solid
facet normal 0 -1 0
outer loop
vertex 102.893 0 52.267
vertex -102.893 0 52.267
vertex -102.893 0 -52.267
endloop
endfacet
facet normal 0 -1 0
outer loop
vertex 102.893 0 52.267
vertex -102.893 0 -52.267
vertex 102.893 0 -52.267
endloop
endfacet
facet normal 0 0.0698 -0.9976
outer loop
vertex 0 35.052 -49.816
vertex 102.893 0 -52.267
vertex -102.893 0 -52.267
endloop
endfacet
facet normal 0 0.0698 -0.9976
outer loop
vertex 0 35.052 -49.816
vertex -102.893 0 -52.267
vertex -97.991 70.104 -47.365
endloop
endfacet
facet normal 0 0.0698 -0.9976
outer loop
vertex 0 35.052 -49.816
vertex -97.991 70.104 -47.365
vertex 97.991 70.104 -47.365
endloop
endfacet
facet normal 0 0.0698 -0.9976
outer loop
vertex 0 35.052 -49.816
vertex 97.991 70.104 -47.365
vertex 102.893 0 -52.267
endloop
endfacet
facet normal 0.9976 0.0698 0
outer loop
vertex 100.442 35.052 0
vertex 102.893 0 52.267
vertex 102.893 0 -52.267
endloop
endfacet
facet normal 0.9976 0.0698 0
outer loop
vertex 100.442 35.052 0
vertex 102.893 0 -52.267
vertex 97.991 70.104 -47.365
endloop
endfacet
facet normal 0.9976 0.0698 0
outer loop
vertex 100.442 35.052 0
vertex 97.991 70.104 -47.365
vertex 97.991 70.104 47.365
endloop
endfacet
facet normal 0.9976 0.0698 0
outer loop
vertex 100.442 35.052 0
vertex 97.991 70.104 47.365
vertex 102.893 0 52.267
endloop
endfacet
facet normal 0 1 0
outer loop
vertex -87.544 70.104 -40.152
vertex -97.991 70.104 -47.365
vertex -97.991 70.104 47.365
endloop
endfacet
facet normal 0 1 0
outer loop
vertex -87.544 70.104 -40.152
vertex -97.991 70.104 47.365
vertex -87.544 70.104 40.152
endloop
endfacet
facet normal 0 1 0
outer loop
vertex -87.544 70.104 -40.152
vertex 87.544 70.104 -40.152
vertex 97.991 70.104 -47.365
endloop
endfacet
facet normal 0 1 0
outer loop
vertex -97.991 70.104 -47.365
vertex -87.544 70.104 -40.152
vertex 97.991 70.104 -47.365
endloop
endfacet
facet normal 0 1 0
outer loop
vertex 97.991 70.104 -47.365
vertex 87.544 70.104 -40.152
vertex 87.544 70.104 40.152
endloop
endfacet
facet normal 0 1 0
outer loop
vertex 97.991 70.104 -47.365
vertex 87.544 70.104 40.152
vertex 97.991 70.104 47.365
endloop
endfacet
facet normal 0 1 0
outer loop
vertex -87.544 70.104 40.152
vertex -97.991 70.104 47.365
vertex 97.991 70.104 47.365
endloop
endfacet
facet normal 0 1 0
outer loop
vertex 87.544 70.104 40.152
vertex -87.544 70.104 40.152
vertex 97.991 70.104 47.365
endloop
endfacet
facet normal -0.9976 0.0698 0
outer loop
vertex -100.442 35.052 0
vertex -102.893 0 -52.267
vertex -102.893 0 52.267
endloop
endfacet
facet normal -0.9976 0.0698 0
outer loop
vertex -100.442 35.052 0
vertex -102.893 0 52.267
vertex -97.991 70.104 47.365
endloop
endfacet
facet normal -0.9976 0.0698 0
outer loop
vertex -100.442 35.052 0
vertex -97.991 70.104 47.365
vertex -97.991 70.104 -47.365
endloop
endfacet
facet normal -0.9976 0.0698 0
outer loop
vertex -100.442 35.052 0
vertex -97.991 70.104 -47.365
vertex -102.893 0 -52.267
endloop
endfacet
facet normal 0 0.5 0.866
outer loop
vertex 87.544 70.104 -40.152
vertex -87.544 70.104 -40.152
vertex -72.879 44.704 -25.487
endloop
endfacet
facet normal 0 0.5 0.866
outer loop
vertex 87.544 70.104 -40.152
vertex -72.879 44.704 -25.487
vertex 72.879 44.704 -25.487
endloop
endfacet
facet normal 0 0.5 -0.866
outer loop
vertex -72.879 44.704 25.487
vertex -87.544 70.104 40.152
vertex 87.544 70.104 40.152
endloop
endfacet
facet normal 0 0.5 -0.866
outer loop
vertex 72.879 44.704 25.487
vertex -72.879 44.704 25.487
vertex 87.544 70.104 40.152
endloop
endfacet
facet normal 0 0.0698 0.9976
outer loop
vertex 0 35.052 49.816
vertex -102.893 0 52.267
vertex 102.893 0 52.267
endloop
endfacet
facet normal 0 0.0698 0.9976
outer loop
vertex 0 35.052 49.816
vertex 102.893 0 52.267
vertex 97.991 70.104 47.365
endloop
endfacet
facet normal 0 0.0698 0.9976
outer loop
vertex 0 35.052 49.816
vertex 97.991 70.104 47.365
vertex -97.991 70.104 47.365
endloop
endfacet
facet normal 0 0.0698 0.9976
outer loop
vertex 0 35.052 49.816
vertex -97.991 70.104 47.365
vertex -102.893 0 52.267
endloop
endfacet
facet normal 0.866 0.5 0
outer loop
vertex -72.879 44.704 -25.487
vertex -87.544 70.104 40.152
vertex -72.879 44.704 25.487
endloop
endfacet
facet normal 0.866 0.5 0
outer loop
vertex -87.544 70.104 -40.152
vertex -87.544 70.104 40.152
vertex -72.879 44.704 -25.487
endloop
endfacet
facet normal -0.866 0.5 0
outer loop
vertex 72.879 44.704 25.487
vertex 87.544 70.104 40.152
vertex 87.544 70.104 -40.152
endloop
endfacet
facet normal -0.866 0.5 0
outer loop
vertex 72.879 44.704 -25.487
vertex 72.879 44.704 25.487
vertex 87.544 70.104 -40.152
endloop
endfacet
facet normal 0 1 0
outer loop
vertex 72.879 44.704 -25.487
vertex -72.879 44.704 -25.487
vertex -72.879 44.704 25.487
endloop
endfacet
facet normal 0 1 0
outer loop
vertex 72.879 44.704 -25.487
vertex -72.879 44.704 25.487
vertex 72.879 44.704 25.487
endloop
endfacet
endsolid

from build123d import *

# Parameters (mm, degrees)
SKETCH1_W           = 205.785682804
SKETCH1_H           = 104.534748446
BOSS_EXTRUDE1_DEPTH = 70.104
BOSS_EXTRUDE1_TAPER = 4
SKETCH2_W           = 145.758865666
SKETCH2_H           = 50.974097726
CUT_EXTRUDE1_DEPTH  = 25.4
DRAFT1_ANGLE        = 30


with BuildPart() as part:
    # Sketch1 → Boss-Extrude1 (new body)
    with BuildSketch(Plane(origin=(0, 0, 0), x_dir=(1, 0, 0), z_dir=(0, 1, 0))):
        Rectangle(SKETCH1_W, SKETCH1_H)
    extrude(amount=BOSS_EXTRUDE1_DEPTH, taper=BOSS_EXTRUDE1_TAPER)

    # Sketch2 → Cut-Extrude1 (cut)
    with BuildSketch(Plane(origin=(0, 70.104, 0), x_dir=(1, 0, 0), z_dir=(0, 1, 0))):
        Rectangle(SKETCH2_W, SKETCH2_H)
    extrude(amount=-CUT_EXTRUDE1_DEPTH, mode=Mode.SUBTRACT)

    # Draft1
    draft1_faces = [part.faces().sort_by_distance(p)[0] for p in [
        (0, 57.404, 25.487048863),
        (72.879432833, 57.404, 0),
        (0, 57.404, -25.487048863),
        (-72.879432833, 57.404, 0),
    ]]
    draft(draft1_faces, Plane.ZX.offset(44.704), DRAFT1_ANGLE)


solid = part.part
